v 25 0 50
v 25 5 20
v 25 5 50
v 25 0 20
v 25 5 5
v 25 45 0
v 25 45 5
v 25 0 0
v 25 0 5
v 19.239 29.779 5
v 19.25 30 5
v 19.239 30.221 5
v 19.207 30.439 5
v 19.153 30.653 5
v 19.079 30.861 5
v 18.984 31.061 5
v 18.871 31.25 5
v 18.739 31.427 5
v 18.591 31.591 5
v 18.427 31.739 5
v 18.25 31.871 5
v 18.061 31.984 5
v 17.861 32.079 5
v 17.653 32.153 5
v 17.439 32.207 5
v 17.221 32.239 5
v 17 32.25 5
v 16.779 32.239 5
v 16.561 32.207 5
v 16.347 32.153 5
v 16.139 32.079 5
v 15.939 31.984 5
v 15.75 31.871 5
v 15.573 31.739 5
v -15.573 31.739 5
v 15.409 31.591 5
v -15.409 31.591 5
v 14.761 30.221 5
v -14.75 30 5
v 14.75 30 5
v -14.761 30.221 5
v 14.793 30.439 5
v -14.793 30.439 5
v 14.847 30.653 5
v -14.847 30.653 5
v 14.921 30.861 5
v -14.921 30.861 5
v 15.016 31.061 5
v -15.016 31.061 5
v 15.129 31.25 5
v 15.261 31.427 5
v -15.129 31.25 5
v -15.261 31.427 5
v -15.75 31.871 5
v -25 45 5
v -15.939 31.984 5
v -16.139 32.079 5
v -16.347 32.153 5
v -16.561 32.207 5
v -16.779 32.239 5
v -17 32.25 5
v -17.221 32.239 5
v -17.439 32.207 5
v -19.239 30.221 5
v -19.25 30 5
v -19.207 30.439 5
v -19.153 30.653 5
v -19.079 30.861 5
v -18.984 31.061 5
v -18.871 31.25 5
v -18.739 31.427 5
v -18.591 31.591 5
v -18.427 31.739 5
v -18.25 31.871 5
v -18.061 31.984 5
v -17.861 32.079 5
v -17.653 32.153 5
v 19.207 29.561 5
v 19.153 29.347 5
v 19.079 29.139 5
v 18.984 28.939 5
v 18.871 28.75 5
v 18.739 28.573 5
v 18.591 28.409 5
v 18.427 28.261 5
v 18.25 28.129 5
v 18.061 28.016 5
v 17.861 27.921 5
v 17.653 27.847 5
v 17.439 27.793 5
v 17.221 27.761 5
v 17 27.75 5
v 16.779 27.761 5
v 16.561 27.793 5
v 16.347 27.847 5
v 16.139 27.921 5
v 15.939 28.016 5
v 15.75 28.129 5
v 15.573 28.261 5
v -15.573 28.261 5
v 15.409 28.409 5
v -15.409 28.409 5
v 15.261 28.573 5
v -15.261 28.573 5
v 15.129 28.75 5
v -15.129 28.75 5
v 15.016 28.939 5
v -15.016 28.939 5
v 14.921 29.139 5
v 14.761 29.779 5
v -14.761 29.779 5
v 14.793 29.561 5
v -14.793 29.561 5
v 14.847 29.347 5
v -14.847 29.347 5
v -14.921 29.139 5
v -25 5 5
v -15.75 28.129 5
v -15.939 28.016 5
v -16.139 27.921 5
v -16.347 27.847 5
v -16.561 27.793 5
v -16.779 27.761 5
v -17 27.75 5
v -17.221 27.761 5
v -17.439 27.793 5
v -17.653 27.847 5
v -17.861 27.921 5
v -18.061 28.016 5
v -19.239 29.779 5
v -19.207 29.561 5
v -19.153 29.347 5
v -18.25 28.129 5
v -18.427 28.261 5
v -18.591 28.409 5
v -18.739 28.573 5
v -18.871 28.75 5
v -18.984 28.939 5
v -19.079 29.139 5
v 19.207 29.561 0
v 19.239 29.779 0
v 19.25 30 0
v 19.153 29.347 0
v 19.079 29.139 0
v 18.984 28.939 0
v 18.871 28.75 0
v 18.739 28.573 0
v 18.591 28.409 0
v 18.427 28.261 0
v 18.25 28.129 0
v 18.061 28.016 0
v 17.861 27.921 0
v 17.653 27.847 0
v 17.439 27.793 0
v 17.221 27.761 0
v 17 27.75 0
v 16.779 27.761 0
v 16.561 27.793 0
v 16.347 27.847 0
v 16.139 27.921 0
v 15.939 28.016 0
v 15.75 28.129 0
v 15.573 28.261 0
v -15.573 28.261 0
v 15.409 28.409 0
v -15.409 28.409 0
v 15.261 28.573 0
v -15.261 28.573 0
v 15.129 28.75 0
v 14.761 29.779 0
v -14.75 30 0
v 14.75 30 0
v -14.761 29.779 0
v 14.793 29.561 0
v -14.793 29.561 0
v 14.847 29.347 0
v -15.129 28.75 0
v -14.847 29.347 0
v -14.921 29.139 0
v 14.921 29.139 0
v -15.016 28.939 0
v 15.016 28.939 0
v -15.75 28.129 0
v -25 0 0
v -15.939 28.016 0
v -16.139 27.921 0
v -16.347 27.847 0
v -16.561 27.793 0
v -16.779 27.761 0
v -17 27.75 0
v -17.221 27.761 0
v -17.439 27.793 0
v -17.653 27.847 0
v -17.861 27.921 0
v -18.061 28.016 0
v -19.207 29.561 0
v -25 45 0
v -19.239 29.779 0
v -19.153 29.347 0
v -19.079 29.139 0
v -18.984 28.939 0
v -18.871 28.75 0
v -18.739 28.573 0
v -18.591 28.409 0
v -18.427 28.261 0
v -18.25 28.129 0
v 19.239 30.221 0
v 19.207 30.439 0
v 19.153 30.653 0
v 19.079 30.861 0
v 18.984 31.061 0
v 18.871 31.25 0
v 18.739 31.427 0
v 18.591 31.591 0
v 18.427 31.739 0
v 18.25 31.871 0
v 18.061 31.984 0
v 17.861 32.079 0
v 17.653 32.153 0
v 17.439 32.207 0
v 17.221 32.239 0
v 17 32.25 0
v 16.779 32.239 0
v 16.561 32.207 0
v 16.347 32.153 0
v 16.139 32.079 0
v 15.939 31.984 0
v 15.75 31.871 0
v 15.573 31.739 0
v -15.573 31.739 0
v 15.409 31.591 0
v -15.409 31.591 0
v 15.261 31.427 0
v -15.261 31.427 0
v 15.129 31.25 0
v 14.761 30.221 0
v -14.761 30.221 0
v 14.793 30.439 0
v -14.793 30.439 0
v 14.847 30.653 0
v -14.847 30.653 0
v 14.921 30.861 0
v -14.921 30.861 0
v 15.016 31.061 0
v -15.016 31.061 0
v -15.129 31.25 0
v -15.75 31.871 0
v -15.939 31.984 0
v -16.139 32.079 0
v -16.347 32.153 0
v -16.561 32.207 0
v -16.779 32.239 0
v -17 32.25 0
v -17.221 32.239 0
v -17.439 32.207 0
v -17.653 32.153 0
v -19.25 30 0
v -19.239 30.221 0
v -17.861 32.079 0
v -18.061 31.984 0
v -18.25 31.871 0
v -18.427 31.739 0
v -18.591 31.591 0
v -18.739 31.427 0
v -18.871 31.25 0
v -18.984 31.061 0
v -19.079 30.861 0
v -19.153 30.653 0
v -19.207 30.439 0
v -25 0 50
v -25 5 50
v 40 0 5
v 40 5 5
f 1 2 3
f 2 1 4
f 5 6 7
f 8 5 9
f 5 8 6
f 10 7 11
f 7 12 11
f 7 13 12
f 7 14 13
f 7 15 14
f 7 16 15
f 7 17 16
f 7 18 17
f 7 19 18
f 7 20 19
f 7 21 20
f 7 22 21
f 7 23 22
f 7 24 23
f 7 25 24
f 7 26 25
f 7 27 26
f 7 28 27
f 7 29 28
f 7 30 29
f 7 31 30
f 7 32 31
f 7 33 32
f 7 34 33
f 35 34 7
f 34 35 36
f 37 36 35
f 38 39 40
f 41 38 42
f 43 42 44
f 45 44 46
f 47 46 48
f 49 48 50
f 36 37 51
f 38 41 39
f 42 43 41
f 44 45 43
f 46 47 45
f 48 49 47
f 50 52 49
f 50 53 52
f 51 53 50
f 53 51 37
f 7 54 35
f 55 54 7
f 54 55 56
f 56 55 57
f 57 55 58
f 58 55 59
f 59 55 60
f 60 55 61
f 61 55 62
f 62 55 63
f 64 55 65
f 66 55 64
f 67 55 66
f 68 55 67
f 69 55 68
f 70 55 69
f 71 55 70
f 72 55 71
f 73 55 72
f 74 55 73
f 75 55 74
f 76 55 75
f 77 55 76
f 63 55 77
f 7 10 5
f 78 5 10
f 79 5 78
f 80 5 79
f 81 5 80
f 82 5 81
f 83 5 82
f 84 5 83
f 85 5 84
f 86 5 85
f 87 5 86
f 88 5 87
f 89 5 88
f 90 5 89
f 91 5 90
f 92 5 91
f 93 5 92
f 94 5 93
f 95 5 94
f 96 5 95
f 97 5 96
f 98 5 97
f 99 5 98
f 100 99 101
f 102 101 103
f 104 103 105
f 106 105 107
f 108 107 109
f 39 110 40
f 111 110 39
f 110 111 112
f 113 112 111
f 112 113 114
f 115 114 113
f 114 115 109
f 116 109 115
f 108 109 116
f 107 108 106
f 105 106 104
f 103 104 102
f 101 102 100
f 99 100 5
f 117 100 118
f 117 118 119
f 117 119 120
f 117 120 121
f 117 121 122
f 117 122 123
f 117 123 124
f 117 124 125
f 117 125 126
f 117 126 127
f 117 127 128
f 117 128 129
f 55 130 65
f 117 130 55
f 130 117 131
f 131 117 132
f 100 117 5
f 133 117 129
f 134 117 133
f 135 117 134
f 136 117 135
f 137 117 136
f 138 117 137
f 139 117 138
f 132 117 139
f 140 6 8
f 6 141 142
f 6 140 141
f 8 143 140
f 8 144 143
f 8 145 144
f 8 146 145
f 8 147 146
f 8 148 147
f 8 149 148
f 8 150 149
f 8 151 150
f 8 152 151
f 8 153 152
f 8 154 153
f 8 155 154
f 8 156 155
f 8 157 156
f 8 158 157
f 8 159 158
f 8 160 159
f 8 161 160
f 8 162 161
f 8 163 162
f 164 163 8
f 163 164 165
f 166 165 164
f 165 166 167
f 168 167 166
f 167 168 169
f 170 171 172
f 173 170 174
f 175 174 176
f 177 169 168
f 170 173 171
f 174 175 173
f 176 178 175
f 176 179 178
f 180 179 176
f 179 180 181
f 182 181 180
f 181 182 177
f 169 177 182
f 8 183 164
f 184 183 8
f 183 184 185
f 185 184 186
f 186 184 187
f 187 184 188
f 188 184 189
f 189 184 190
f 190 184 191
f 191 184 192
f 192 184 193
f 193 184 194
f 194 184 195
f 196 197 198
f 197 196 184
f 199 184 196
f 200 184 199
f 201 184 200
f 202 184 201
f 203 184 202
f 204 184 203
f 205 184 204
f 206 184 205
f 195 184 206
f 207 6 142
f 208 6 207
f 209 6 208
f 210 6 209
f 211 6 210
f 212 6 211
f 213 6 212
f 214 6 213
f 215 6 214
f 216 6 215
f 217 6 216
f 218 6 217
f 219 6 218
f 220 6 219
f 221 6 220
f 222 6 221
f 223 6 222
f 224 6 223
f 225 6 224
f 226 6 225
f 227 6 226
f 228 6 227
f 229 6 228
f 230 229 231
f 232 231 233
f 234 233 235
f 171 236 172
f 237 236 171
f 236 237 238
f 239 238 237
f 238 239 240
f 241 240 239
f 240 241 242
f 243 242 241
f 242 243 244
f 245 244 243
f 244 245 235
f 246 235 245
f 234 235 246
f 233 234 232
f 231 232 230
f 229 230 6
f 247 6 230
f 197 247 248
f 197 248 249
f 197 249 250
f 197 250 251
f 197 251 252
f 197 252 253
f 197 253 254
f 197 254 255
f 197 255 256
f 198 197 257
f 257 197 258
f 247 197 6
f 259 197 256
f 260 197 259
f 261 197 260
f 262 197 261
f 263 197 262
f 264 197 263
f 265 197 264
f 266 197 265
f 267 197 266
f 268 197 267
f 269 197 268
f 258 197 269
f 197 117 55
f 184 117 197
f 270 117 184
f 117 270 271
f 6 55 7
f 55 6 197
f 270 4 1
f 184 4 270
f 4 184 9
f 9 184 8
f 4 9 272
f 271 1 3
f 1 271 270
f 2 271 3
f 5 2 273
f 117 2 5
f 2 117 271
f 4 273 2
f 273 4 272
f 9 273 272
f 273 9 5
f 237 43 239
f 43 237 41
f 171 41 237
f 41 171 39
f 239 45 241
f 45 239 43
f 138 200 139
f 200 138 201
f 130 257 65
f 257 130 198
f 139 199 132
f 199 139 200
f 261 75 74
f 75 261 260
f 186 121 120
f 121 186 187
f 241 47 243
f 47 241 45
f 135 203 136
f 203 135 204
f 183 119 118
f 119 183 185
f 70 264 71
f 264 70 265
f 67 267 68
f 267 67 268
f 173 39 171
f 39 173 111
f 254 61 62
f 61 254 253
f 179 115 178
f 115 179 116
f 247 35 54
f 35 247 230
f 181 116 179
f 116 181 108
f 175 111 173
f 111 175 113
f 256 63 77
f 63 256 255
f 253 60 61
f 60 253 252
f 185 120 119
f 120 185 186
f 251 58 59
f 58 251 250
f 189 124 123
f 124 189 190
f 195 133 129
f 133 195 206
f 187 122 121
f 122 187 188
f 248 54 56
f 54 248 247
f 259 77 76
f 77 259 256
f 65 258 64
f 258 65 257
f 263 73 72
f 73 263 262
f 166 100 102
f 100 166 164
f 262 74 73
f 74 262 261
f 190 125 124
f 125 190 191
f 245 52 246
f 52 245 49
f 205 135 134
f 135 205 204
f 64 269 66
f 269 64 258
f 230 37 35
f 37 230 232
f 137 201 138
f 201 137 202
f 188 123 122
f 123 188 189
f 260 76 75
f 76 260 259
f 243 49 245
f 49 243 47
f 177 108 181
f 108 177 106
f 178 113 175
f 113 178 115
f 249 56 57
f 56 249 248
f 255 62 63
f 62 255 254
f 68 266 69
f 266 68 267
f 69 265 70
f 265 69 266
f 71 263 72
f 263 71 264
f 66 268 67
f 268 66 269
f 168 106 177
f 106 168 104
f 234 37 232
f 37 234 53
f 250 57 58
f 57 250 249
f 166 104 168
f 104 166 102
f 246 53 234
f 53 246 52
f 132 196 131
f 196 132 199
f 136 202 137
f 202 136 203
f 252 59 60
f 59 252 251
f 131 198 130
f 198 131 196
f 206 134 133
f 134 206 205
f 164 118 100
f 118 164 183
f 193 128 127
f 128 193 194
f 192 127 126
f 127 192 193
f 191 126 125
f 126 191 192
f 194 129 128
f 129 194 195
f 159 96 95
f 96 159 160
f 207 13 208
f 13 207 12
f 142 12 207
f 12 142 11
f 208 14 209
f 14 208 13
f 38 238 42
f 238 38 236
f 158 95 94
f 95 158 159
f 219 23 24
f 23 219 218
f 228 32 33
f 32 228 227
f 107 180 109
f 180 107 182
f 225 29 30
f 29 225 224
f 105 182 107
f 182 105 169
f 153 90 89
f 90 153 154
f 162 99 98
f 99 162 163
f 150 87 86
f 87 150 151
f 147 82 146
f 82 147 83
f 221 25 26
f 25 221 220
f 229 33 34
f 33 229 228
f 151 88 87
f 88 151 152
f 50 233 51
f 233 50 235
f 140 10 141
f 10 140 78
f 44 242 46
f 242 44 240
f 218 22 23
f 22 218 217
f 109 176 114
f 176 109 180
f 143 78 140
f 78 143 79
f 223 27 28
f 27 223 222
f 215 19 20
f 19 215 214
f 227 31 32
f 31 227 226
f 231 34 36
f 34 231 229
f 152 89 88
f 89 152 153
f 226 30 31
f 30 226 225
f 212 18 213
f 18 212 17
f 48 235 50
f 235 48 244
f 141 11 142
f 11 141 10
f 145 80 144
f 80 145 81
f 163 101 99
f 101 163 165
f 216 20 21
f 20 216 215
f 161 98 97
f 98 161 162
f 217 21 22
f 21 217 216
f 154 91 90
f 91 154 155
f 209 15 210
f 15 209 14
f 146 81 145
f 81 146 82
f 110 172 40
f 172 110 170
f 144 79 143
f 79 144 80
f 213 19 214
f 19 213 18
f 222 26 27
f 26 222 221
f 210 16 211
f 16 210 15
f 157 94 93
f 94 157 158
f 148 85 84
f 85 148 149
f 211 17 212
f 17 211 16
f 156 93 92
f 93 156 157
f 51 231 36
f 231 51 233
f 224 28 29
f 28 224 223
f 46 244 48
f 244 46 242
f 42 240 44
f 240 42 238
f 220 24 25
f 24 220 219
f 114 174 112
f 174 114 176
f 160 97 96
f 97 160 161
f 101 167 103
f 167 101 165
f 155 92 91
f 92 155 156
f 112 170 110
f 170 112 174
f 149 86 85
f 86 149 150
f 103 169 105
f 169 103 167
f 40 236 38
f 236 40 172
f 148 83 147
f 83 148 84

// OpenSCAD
// L-shaped NEMA 17 stepper motor mounting bracket
// Print orientation: base plate on bed (z=0), builds upward (+Z)

// Base plate dimensions
base_x_min = -25;
base_x_max = 25;
base_y_min = 0;
base_y_max = 45;
base_z_min = 0;
base_z_max = 5;

// Vertical motor plate dimensions
plate_x_min = -25;
plate_x_max = 25;
plate_y_min = 0;
plate_y_max = 5;
plate_z_min = 0;
plate_z_max = 50;

// Base plate M4 through-holes (vertical, along Z)
m4_hole_dia = 4.5;
m4_hole1_x = -17;
m4_hole1_y = 30;
m4_hole2_x = 17;
m4_hole2_y = 30;

// Motor plate centring boss hole (along Y)
boss_hole_dia = 23;
boss_hole_x = 0;
boss_hole_z = 28;

// Motor plate M3 screw holes (along Y)
m3_hole_dia = 3.4;
m3_pattern_size = 31;  // square pattern centred on boss hole
m3_hole_offset = m3_pattern_size / 2;  // 15.5 mm from centre

// Gusset dimensions
gusset_thickness = 5;
gusset_leg_y = 20;  // leg along +Y
gusset_leg_z = 20;  // leg along +Z
gusset_corner_y = 5;  // right-angle corner y position
gusset_corner_z = 5;  // right-angle corner z position

// Left gusset x range
gusset_left_x_min = -25;
gusset_left_x_max = -20;

// Right gusset x range
gusset_right_x_min = 20;
gusset_right_x_max = 25;

$fn = 64;

// Base plate
module base_plate() { translate([base_x_min, base_y_min, base_z_min])
    cube([base_x_max - base_x_min, base_y_max - base_y_min, base_z_max - base_z_min]); }

// Vertical motor plate
module motor_plate() { translate([plate_x_min, plate_y_min, plate_z_min])
    cube([plate_x_max - plate_x_min, plate_y_max - plate_y_min, plate_z_max - plate_z_min]); }

// M4 holes in base plate (vertical through-holes, along Z)
module m4_hole1() { translate([m4_hole1_x, m4_hole1_y, -1])
    cylinder(h = base_z_max - base_z_min + 2, d = m4_hole_dia); }

module m4_hole2() { translate([m4_hole2_x, m4_hole2_y, -1])
    cylinder(h = base_z_max - base_z_min + 2, d = m4_hole_dia); }

// Boss hole in motor plate (along Y)
module boss_hole() { translate([boss_hole_x, -1, boss_hole_z])
    rotate([90, 0, 0])
    cylinder(h = plate_y_max - plate_y_min + 2, d = boss_hole_dia); }

// M3 screw holes in motor plate (along Y)
module m3_hole1() { translate([boss_hole_x - m3_hole_offset, -1, boss_hole_z - m3_hole_offset])
    rotate([90, 0, 0])
    cylinder(h = plate_y_max - plate_y_min + 2, d = m3_hole_dia); }

module m3_hole2() { translate([boss_hole_x + m3_hole_offset, -1, boss_hole_z - m3_hole_offset])
    rotate([90, 0, 0])
    cylinder(h = plate_y_max - plate_y_min + 2, d = m3_hole_dia); }

module m3_hole3() { translate([boss_hole_x - m3_hole_offset, -1, boss_hole_z + m3_hole_offset])
    rotate([90, 0, 0])
    cylinder(h = plate_y_max - plate_y_min + 2, d = m3_hole_dia); }

module m3_hole4() { translate([boss_hole_x + m3_hole_offset, -1, boss_hole_z + m3_hole_offset])
    rotate([90, 0, 0])
    cylinder(h = plate_y_max - plate_y_min + 2, d = m3_hole_dia); }

// Left gusset: right triangle in YZ plane, extruded along X
// Triangle vertices in YZ: (y=5,z=5), (y=25,z=5), (y=5,z=25)
// Define in XY, rotate 90 about X to map to YZ, then extrude along X
module left_gusset() {
    translate([gusset_left_x_min, gusset_corner_y, gusset_corner_z])
    rotate([90, 0, 0])
    linear_extrude(height = gusset_left_x_max - gusset_left_x_min)
    polygon(points = [[0, 0], [gusset_leg_y, 0], [0, gusset_leg_z]]);
}

// Right gusset: right triangle in YZ plane, extruded along X
module right_gusset() {
    translate([gusset_right_x_min, gusset_corner_y, gusset_corner_z])
    rotate([90, 0, 0])
    linear_extrude(height = gusset_right_x_max - gusset_right_x_min)
    polygon(points = [[0, 0], [gusset_leg_y, 0], [0, gusset_leg_z]]);
}

// Assemble the bracket
difference() {
    union() {
        base_plate();
        motor_plate();
        left_gusset();
        right_gusset();
    }
    // Cut M4 holes from base plate
    m4_hole1();
    m4_hole2();
    // Cut boss hole from motor plate
    boss_hole();
    // Cut M3 screw holes from motor plate
    m3_hole1();
    m3_hole2();
    m3_hole3();
    m3_hole4();
}
